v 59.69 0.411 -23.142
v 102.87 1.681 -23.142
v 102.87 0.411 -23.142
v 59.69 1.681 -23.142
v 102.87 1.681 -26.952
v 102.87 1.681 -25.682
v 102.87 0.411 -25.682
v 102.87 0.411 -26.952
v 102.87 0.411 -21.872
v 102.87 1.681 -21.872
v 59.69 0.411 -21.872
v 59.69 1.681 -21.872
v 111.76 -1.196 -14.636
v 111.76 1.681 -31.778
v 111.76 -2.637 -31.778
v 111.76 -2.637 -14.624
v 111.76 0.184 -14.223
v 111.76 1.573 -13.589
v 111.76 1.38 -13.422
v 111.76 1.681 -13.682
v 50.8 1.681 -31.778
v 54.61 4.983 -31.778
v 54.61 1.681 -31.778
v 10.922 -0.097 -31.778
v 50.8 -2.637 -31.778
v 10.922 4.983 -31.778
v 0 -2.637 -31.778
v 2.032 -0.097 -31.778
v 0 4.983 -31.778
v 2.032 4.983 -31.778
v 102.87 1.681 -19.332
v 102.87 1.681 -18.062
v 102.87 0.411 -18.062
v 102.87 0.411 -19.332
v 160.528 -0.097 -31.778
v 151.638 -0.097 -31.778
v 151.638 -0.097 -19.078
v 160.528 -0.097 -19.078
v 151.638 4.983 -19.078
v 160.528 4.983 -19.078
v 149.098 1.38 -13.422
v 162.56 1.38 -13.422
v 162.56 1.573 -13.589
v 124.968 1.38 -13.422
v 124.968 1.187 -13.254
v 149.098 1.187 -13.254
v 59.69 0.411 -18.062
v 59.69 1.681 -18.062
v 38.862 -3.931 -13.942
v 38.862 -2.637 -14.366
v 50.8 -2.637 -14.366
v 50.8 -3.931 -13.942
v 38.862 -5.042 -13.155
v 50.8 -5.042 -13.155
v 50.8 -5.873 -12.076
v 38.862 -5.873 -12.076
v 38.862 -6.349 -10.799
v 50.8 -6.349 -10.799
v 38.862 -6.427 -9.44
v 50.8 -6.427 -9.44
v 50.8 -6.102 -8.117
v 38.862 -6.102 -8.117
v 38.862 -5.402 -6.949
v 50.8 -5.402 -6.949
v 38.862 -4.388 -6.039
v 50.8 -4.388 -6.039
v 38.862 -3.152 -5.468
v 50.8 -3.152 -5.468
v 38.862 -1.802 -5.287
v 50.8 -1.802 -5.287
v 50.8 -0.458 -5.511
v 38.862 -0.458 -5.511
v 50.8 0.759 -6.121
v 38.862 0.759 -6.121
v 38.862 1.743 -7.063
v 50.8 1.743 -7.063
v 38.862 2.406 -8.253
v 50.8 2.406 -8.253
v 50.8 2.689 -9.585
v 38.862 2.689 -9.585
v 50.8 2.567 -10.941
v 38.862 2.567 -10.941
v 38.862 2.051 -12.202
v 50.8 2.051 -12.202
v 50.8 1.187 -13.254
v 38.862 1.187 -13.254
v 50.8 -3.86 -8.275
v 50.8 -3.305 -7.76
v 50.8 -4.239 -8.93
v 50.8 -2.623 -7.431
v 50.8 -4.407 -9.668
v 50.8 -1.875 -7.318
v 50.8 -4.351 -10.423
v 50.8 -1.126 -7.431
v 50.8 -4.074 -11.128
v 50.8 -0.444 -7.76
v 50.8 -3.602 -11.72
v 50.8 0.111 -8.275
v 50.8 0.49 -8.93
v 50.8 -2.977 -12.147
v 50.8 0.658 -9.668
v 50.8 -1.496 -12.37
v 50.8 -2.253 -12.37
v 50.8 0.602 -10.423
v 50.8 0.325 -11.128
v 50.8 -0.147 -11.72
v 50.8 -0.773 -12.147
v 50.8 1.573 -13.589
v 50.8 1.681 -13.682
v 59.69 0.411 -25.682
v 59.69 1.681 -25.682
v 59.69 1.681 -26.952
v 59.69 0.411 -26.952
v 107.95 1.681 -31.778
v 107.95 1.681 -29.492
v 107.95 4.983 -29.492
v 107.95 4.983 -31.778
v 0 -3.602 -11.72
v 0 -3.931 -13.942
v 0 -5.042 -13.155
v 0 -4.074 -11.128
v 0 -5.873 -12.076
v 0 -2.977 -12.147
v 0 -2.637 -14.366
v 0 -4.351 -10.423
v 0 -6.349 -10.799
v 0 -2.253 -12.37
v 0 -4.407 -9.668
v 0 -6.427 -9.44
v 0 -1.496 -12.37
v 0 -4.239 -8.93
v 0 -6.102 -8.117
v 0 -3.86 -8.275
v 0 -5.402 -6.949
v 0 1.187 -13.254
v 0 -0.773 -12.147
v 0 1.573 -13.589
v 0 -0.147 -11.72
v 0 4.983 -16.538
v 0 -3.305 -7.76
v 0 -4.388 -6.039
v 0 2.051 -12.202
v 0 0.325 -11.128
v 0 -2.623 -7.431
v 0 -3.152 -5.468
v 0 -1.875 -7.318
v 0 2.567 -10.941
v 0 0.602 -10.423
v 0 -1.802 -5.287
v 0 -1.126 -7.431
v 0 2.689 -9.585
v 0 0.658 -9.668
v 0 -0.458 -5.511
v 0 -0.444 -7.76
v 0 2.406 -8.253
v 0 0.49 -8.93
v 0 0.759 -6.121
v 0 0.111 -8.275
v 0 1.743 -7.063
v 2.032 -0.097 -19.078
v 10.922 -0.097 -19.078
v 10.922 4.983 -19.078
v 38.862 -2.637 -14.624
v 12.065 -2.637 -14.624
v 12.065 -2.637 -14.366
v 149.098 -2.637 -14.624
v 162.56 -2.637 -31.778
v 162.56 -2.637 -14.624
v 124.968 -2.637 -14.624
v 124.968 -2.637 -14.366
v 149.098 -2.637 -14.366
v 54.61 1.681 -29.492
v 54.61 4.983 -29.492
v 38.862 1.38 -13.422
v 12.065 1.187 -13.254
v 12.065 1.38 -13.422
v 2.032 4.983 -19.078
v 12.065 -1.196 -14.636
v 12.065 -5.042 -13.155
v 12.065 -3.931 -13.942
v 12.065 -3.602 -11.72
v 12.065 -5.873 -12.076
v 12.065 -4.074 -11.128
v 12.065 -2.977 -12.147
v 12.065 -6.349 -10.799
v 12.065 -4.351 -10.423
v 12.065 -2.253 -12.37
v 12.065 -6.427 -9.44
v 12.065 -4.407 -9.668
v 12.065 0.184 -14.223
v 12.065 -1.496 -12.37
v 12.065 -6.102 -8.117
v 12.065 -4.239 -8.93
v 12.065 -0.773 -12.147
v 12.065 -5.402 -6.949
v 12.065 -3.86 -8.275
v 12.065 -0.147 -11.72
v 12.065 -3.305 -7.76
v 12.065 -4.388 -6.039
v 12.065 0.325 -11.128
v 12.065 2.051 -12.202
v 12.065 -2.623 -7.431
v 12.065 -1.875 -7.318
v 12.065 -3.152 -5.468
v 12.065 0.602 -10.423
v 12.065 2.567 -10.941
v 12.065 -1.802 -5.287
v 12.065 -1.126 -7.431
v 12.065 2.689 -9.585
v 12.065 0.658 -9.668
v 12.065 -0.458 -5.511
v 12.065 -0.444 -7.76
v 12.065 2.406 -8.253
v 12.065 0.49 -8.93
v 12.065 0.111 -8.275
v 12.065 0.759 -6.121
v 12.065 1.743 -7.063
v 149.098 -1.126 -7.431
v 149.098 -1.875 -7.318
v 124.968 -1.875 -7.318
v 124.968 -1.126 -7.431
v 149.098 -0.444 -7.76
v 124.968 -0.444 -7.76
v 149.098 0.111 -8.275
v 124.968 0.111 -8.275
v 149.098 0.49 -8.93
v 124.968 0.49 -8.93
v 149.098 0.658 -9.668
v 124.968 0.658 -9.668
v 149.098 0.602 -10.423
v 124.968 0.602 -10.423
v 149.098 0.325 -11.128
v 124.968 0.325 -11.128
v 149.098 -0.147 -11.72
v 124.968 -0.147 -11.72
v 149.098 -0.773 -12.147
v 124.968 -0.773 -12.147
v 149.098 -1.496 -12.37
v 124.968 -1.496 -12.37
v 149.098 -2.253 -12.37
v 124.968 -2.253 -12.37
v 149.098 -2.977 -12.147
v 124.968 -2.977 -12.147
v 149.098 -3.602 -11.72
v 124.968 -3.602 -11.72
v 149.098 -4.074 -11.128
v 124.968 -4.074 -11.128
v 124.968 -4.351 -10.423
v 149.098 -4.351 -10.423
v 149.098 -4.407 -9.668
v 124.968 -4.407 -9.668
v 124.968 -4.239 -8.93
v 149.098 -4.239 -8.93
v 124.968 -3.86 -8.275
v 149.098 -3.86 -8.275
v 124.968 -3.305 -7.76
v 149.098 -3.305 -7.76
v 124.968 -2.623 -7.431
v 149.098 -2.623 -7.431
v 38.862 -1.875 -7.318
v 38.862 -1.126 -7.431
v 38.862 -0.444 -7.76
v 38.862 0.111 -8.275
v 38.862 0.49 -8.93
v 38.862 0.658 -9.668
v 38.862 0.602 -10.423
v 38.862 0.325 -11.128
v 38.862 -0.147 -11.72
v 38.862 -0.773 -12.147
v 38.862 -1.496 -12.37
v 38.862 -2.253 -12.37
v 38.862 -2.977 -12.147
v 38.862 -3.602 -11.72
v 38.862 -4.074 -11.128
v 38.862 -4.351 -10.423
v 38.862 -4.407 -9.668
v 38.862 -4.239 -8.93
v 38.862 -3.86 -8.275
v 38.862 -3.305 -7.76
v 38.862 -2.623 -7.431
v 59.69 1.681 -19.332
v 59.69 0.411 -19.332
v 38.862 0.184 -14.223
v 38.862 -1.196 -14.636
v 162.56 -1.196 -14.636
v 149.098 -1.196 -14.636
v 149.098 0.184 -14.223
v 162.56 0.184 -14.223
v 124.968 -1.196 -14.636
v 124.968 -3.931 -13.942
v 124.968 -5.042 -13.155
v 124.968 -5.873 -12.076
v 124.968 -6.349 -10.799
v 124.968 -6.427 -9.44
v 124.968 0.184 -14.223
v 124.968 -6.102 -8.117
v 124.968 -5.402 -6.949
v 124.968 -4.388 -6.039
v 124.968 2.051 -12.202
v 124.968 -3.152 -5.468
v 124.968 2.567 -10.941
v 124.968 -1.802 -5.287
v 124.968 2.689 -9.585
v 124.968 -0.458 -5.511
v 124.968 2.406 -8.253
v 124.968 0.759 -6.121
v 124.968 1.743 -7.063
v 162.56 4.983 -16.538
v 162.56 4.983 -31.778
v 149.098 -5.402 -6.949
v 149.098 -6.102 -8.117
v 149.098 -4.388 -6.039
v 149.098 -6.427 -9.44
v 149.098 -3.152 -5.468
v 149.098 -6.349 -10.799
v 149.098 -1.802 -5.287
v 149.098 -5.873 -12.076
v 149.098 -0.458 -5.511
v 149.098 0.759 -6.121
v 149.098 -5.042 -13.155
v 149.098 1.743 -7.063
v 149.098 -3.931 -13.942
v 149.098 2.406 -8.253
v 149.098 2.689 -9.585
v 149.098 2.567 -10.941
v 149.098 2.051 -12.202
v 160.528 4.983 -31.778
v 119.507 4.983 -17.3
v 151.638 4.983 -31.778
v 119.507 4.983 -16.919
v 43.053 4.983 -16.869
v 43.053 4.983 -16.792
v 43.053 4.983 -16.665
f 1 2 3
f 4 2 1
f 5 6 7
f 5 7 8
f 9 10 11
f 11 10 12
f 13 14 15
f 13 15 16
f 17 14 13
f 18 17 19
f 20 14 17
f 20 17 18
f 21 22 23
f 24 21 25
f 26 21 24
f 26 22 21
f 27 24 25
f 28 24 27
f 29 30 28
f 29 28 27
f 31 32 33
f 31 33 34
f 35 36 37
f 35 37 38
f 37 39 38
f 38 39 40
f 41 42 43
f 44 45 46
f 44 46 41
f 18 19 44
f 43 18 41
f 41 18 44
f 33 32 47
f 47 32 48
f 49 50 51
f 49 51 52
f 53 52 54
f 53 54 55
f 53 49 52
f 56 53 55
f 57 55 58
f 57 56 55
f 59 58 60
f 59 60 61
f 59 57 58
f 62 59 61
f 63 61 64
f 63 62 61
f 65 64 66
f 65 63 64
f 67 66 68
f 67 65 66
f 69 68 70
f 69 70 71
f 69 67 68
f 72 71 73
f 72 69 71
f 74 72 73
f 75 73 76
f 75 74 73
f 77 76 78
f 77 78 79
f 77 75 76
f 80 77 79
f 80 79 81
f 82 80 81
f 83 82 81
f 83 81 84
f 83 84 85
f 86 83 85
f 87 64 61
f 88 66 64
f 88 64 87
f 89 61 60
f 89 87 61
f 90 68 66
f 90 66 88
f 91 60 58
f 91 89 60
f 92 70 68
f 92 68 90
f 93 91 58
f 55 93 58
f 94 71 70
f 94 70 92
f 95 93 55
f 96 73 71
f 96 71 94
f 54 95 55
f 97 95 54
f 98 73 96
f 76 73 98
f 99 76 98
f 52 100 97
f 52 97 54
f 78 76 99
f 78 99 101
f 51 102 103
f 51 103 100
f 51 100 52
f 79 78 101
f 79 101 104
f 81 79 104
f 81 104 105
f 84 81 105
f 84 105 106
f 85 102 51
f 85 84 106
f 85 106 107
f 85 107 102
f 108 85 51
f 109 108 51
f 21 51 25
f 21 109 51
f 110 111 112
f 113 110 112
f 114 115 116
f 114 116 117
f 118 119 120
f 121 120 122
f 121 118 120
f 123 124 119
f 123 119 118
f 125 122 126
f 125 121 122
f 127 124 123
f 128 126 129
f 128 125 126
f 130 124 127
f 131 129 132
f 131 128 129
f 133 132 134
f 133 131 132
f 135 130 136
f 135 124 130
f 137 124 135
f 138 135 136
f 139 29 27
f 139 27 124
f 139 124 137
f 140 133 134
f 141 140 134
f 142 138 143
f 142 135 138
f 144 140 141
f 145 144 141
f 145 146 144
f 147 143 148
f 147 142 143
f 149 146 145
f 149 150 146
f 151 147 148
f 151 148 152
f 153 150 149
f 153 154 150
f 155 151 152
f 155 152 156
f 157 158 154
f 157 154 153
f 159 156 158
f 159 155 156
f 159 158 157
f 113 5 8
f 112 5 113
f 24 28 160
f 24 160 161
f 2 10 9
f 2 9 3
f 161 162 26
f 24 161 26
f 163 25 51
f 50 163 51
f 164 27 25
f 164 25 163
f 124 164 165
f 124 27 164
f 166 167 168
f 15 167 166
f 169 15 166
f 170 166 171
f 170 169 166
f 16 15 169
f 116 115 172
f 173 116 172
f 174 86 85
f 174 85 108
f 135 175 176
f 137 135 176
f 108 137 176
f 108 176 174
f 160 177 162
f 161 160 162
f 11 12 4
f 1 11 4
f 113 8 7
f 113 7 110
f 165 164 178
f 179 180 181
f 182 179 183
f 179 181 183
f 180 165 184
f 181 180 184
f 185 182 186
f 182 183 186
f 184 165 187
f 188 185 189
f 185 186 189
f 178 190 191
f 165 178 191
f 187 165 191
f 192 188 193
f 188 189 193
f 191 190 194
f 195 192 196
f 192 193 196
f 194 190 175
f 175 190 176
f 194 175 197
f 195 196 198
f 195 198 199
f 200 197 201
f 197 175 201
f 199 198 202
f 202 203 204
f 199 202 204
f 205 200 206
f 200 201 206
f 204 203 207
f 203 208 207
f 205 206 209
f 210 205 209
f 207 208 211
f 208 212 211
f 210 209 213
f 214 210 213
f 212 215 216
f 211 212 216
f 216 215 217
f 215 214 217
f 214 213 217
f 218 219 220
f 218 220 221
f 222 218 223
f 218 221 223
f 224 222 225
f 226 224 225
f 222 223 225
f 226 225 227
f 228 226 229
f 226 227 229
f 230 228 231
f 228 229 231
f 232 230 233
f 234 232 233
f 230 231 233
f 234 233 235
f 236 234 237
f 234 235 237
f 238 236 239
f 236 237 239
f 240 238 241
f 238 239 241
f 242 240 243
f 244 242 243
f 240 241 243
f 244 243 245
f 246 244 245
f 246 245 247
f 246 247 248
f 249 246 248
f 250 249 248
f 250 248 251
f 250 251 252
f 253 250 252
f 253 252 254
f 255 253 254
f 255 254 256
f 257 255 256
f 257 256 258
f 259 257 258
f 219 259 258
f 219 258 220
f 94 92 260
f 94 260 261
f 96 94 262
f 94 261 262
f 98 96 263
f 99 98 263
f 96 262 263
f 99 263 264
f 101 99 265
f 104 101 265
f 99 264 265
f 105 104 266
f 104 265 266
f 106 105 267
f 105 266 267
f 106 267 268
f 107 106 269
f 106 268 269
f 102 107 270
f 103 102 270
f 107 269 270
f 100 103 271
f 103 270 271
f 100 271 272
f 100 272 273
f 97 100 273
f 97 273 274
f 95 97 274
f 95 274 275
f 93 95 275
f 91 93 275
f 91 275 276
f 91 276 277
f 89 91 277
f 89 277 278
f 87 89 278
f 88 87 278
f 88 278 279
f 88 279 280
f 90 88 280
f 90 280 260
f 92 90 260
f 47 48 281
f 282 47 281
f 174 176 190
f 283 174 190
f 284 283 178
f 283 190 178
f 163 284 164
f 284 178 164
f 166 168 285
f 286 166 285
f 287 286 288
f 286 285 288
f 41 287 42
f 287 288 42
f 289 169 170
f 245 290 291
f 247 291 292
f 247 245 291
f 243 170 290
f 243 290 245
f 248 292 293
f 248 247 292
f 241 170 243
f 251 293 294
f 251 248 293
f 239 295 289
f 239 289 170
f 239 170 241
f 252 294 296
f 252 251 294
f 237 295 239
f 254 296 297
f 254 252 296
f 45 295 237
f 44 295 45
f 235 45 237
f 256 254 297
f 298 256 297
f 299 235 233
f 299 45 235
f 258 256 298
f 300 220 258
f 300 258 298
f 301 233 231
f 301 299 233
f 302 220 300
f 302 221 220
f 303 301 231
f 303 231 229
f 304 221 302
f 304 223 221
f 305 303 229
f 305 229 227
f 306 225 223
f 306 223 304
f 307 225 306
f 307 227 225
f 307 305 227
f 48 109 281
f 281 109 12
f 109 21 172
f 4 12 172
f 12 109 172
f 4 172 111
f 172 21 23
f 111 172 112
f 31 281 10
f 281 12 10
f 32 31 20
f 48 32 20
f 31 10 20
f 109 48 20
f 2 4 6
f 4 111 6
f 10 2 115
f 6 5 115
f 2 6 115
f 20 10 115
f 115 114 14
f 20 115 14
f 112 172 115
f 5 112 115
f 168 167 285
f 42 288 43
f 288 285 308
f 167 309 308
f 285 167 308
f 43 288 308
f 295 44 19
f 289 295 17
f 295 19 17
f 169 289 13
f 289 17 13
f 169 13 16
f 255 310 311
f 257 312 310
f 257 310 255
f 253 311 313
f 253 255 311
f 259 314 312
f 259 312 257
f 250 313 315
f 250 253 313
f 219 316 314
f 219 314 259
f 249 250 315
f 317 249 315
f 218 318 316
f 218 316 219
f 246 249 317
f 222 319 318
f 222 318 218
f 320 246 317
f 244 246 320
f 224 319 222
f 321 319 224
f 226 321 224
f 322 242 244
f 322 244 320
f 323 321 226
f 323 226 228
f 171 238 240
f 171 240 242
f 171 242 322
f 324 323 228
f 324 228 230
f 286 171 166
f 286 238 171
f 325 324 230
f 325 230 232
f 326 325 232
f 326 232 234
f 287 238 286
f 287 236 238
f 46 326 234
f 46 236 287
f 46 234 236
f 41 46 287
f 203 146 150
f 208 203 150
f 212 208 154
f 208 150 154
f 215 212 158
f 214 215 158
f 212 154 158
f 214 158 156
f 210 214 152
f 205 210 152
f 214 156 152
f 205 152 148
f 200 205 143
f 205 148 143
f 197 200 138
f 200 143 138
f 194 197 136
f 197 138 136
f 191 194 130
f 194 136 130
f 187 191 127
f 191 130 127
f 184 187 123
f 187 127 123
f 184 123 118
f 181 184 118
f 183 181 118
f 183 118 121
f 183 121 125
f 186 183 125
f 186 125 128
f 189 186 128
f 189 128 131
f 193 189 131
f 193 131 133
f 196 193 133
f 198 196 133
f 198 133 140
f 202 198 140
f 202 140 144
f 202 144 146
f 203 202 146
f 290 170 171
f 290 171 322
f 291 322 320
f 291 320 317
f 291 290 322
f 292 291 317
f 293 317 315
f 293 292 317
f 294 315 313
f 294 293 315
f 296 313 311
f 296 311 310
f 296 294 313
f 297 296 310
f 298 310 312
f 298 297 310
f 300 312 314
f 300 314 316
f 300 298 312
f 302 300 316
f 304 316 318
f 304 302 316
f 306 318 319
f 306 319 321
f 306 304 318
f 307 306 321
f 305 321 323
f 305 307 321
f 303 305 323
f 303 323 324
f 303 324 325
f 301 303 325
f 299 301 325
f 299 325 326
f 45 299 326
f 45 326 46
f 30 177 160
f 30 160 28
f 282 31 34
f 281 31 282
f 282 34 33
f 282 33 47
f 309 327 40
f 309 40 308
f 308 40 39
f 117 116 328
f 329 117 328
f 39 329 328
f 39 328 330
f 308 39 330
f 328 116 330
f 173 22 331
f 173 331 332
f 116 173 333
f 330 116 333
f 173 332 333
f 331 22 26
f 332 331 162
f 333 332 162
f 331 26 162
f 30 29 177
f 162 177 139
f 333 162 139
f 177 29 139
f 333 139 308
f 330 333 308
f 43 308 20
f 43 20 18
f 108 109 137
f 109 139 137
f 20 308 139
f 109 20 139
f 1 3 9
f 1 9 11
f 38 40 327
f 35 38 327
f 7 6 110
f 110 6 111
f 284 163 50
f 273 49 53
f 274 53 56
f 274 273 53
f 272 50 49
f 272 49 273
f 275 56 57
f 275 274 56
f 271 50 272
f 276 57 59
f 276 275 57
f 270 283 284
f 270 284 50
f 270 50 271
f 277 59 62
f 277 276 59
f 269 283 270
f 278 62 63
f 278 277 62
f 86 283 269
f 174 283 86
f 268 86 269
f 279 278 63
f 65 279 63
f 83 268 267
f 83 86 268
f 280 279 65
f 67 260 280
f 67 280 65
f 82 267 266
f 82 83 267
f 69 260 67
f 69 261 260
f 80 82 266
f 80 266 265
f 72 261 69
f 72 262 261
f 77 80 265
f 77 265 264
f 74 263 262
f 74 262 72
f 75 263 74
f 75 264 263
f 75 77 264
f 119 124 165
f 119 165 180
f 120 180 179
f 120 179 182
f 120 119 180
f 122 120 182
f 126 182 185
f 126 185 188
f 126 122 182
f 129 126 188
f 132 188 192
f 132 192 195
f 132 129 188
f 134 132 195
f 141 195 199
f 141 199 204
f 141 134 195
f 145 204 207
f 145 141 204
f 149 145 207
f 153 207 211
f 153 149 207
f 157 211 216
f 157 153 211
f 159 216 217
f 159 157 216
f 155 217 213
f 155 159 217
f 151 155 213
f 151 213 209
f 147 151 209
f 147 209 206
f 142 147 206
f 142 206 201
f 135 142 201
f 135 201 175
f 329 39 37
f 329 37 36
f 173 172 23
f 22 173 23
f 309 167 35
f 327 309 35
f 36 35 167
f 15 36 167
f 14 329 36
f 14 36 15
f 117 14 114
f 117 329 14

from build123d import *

# Parameters (mm, degrees)
SKETCH1_R                = 1.6002
SKETCH1_R_2              = 0.8128
BOSS_EXTRUDE5_DEPTH      = 162.56
CUT_EXTRUDE1_DEPTH       = 14.351
SKETCH3_W                = 0.889
SKETCH3_H                = 5.842
BOSS_EXTRUDE6_DEPTH      = 36.957
SKETCH16_W               = 13.462
SKETCH16_H               = 6.460130881
BOSS_EXTRUDE7_DEPTH      = 33.02
CUT_EXTRUDE4_DEPTH       = 15.24
SKETCH18_W               = 1.778
SKETCH18_H               = 5.842
BOSS_EXTRUDE8_DEPTH      = 38.1
CUT_EXTRUDE5_DEPTH       = 14.224
SKETCH20_W               = 2.1336
SKETCH20_H               = 5.461
BOSS_EXTRUDE9_DEPTH      = 36.322
SKETCH22_R               = 1.4224
CUT_EXTRUDE7_DEPTH       = 20.32
CUT_EXTRUDE7_DEPTH_BACK  = 24.13
SKETCH25_W               = 112.268
SKETCH25_H               = 3.007323321
CUT_EXTRUDE8_DEPTH       = 24.13
SKETCH27_R               = 1.778
CUT_EXTRUDE9_DEPTH       = 112.268
CUT_EXTRUDE12_DEPTH      = 14.224
SKETCH34_W               = 43.053
SKETCH34_H               = 2.1336
BOSS_EXTRUDE14_DEPTH     = 7.112
SKETCH35_R               = 1.4224
CUT_EXTRUDE13_DEPTH      = 7.112
SKETCH37_W               = 60.96
SKETCH37_H               = 15.24
CUT_EXTRUDE14_DEPTH      = 3.048
SKETCH38_R               = 0.8128
CUT_EXTRUDE15_DEPTH      = 5.08
SKETCH39_R               = 0.8128
CUT_EXTRUDE16_DEPTH      = 5.08
SKETCH40_W               = 60.96
SKETCH40_H               = 2.54
CUT_EXTRUDE17_DEPTH      = 3.048
SKETCH41_R               = 1.161307013
BOSS_EXTRUDE15_DEPTH     = 6.604
SKETCH42_R               = 1.020818471
BOSS_EXTRUDE16_DEPTH     = 5.588
SKETCH43_R               = 0.8128
CUT_EXTRUDE18_DEPTH      = 5.08
SKETCH44_R               = 0.8128
CUT_EXTRUDE19_DEPTH      = 5.08
SKETCH46_W               = 60.96
SKETCH46_H               = 9.087986699
CUT_EXTRUDE21_DEPTH      = 3.048
SKETCH47_W               = 53.34
SKETCH47_H               = 2.286
CUT_EXTRUDE22_DEPTH      = 15.24
SKETCH48_R               = 2.54
BOSS_EXTRUDE17_DEPTH     = 25.146
SKETCH49_R               = 2.54
BOSS_EXTRUDE18_DEPTH     = 25.146
SKETCH50_R               = 2.794
CUT_EXTRUDE23_DEPTH      = 112.268
SKETCH51_R               = 1.27
CUT_EXTRUDE24_DEPTH      = 174.498
CUT_EXTRUDE25_DEPTH      = 1.27
SKETCH55_W               = 46.703523857
SKETCH55_H               = 5.873481267
CUT_EXTRUDE26_DEPTH      = 9.144
CUT_EXTRUDE26_DEPTH_BACK = 8.636
SKETCH57_R               = 1.029255476
BOSS_EXTRUDE20_DEPTH     = 5.08
SKETCH58_R               = 1.09273592
BOSS_EXTRUDE21_DEPTH     = 7.112
SKETCH59_R               = 1.016
CUT_EXTRUDE27_DEPTH      = 66.04
CUT_EXTRUDE27_DEPTH_BACK = 5.08
SKETCH60_R               = 1.869467668
SKETCH60_R_2             = 1.016
BOSS_EXTRUDE22_DEPTH     = 162.56
SKETCH61_R               = 2.219373527
CUT_EXTRUDE28_DEPTH      = 112.268
SKETCH62_R               = 1.016
BOSS_EXTRUDE26_DEPTH     = 25.654
SKETCH65_R               = 1.016
BOSS_EXTRUDE27_DEPTH     = 25.654
SKETCH67_R               = 2.794
CUT_EXTRUDE32_DEPTH      = 12.827
SKETCH68_R               = 2.794
CUT_EXTRUDE33_DEPTH      = 12.827
SKETCH72_R               = 2.794
CUT_EXTRUDE34_DEPTH      = 25.654
BOSS_EXTRUDE28_DEPTH     = 0.127
SKETCH77_R               = 1.016
BOSS_EXTRUDE29_DEPTH     = 0.254
SKETCH79_R               = 1.016
CUT_EXTRUDE35_DEPTH      = 15.748
SKETCH87_W               = 23.622
SKETCH87_H               = 13.462
BOSS_EXTRUDE30_DEPTH     = 6.096
CUT_EXTRUDE36_DEPTH      = 14.9098
SKETCH89_W               = 1.4478
SKETCH89_H               = 6.35
BOSS_EXTRUDE31_DEPTH     = 30.6578
BOSS_EXTRUDE32_DEPTH     = 2.159
BOSS_EXTRUDE33_DEPTH     = 2.159
CUT_EXTRUDE38_DEPTH      = 43.053
BOSS_EXTRUDE35_DEPTH     = 14.859
SKETCH98_W               = 13.462
SKETCH98_H               = 6.35
CUT_EXTRUDE41_DEPTH      = 19.431
BOSS_EXTRUDE36_DEPTH     = 15.113
SKETCH102_W              = 13.462
SKETCH102_H              = 6.35
CUT_EXTRUDE42_DEPTH      = 27.051
BOSS_EXTRUDE39_DEPTH     = 2.159
BOSS_EXTRUDE40_DEPTH     = 14.986
BOSS_EXTRUDE41_DEPTH     = 2.159
SKETCH107_R              = 5.08
CUT_EXTRUDE43_DEPTH      = 173.736
SKETCH108_R              = 4.572
SKETCH108_R_2            = 2.54
BOSS_EXTRUDE43_DEPTH     = 162.56
SKETCH111_R              = 5.08
CUT_EXTRUDE44_DEPTH      = 60.96
SKETCH112_R              = 4.826
CUT_EXTRUDE45_DEPTH      = 13.462
SKETCH114_R              = 4.826
CUT_EXTRUDE46_DEPTH      = 26.797
SKETCH116_R              = 4.826
CUT_EXTRUDE47_DEPTH      = 13.208
SKETCH125_R              = 1.016
BOSS_EXTRUDE44_DEPTH     = 8.001
SKETCH126_R              = 1.016
BOSS_EXTRUDE45_DEPTH     = 7.747
SKETCH127_W              = 43.18
SKETCH127_H              = 1.27
BOSS_EXTRUDE46_DEPTH     = 1.27
SKETCH129_W              = 13.462
SKETCH129_H              = 6.35
BOSS_EXTRUDE47_DEPTH     = 47.244
SKETCH130_W              = 12.904618135
SKETCH130_H              = 7.62
BOSS_EXTRUDE48_DEPTH     = 46.482
SKETCH131_W              = 8.89
SKETCH131_H              = 12.7
CUT_EXTRUDE48_DEPTH      = 5.08


with BuildPart() as part:
    # Sketch1 → Boss-Extrude5 (new body)
    with BuildSketch(Plane(origin=(0, 0, 0), x_dir=(0, 0, -1), z_dir=(1, 0, 0))):
        with BuildLine():
            ThreePointArc((11.4584801, -1.874600251), (11.409460099, -2.267640517), (11.265403421, -2.636600251))
            Line((11.265403421, -2.636600251), (11.4584801, -2.636600251))
            Line((11.4584801, -2.636600251), (31.7784801, -2.636600251))
            Line((31.7784801, -2.636600251), (31.7784801, 4.983399749))
            Line((31.7784801, 4.983399749), (16.5384801, 4.983399749))
            Line((16.5384801, 4.983399749), (11.265403421, -1.112600251))
            ThreePointArc((11.265403421, -1.112600251), (11.409460099, -1.481559985), (11.4584801, -1.874600251))
        make_face()
        with Locations((9.8582801, -1.874600251)):
            Circle(SKETCH1_R)
        with Locations((9.8582801, -1.874600251)):
            Circle(SKETCH1_R_2, mode=Mode.SUBTRACT)
    extrude(amount=BOSS_EXTRUDE5_DEPTH)

    # Sketch2 → Cut-Extrude1 (cut)
    with BuildSketch(Plane(origin=(0, 0, -31.7784801), x_dir=(-1, 0, 0), z_dir=(0, 0, -1))):
        Polygon((0, 4.983399749), (0, -0.858600251), (-17.78, -0.858600251), (-23.622, 4.983399749), align=None)
    extrude(amount=-CUT_EXTRUDE1_DEPTH, mode=Mode.SUBTRACT)

    # Sketch3 → Boss-Extrude6 (add)
    with BuildSketch(Plane.ZY):
        with Locations((-31.3339801, 2.062399749)):
            Rectangle(SKETCH3_W, SKETCH3_H)
    extrude(amount=-BOSS_EXTRUDE6_DEPTH)

    # Sketch16 → Boss-Extrude7 (add)
    with BuildSketch(Plane.ZY):
        with Locations((-24.1584801, 1.753334308)):
            Rectangle(SKETCH16_W, SKETCH16_H)
    extrude(amount=-BOSS_EXTRUDE7_DEPTH)

    # Sketch17 → Cut-Extrude4 (cut)
    with BuildSketch(Plane(origin=(0, 0, -31.7784801), x_dir=(-1, 0, 0), z_dir=(0, 0, -1))):
        Polygon((0, 4.983399749), (0, -0.858600251), (-17.78, -0.858600251), (-23.622, 4.983399749), align=None)
    extrude(amount=-CUT_EXTRUDE4_DEPTH, mode=Mode.SUBTRACT)

    # Sketch18 → Boss-Extrude8 (add)
    with BuildSketch(Plane.ZY):
        with Locations((-30.8894801, 2.062399749)):
            Rectangle(SKETCH18_W, SKETCH18_H)
    extrude(amount=-BOSS_EXTRUDE8_DEPTH)

    # Sketch19 → Cut-Extrude5 (cut)
    with BuildSketch(Plane(origin=(0, 0, -31.7784801), x_dir=(-1, 0, 0), z_dir=(0, 0, -1))):
        Polygon((-162.56, 4.983399749), (-162.56, -0.477600251), (-142.24, -0.477600251), (-136.779, 4.983399749), align=None)
    extrude(amount=-CUT_EXTRUDE5_DEPTH, mode=Mode.SUBTRACT)

    # Sketch20 → Boss-Extrude9 (add)
    with BuildSketch(Plane(origin=(162.56, 0, 0), x_dir=(0, 0, -1), z_dir=(1, 0, 0))):
        with Locations((30.7116801, 2.252899749)):
            Rectangle(SKETCH20_W, SKETCH20_H)
    extrude(amount=-BOSS_EXTRUDE9_DEPTH)

    # Sketch22 → Cut-Extrude7 (cut, two sides)
    with BuildSketch(Plane(origin=(0, -0.477600251, 0), x_dir=(1, 0, 0), z_dir=(0, 1, 0))) as cut_extrude7_sk:
        with Locations((145.9484, 26.5714801)):
            Circle(SKETCH22_R)
        with BuildLine():
            ThreePointArc((147.3708, 26.5714801), (146.954188686, 25.565691415), (145.9484, 25.1490801))
            Line((145.9484, 25.1490801), (157.217057139, 25.1490801))
            ThreePointArc((157.217057139, 25.1490801), (155.794657139, 26.5714801), (157.217057139, 27.9938801))
            Line((157.217057139, 27.9938801), (145.9484, 27.9938801))
            ThreePointArc((145.9484, 27.9938801), (146.954188686, 27.577268786), (147.3708, 26.5714801))
        make_face()
        with Locations((157.217057139, 26.5714801)):
            Circle(SKETCH22_R)
        with BuildLine():
            ThreePointArc((157.217057139, 19.1292801), (155.794657139, 20.5516801), (157.217057139, 21.9740801))
            Line((157.217057139, 21.9740801), (145.9484, 21.9740801))
            ThreePointArc((145.9484, 21.9740801), (146.954188686, 21.557468786), (147.3708, 20.5516801))
            ThreePointArc((147.3708, 20.5516801), (146.954188686, 19.545891415), (145.9484, 19.1292801))
            Line((145.9484, 19.1292801), (157.217057139, 19.1292801))
        make_face()
        with Locations((157.217057139, 20.5516801)):
            Circle(SKETCH22_R)
        with Locations((145.9484, 20.5516801)):
            Circle(SKETCH22_R)
    extrude(amount=CUT_EXTRUDE7_DEPTH, mode=Mode.SUBTRACT)
    extrude(cut_extrude7_sk.sketch, amount=-CUT_EXTRUDE7_DEPTH_BACK, mode=Mode.SUBTRACT)

    # Sketch25 → Cut-Extrude8 (cut)
    with BuildSketch(Plane(origin=(0, 4.983399749, 0), x_dir=(1, 0, 0), z_dir=(0, 1, 0))):
        with Locations((81.28, 9.761741761)):
            Rectangle(SKETCH25_W, SKETCH25_H)
    extrude(amount=-CUT_EXTRUDE8_DEPTH, mode=Mode.SUBTRACT)

    # Sketch27 → Cut-Extrude9 (cut)
    with BuildSketch(Plane.ZY.offset(-137.414)):
        with Locations((-9.8582801, -1.874600251)):
            Circle(SKETCH27_R)
    extrude(amount=CUT_EXTRUDE9_DEPTH, mode=Mode.SUBTRACT)

    # Sketch31 → Cut-Extrude12 (cut)
    with BuildSketch(Plane(origin=(0, 0, -31.7784801), x_dir=(-1, 0, 0), z_dir=(0, 0, -1))):
        Polygon((-162.56, 4.983399749), (-162.56, -0.477600251), (-124.968, -0.477600251), (-119.507, 4.983399749), (-124.079, 4.983399749), align=None)
    extrude(amount=-CUT_EXTRUDE12_DEPTH, mode=Mode.SUBTRACT)

    # Sketch34 → Boss-Extrude14 (add)
    with BuildSketch(Plane(origin=(0, 4.983399749, 0), x_dir=(1, 0, 0), z_dir=(0, 1, 0))):
        with Locations((141.0335, 30.7116801)):
            Rectangle(SKETCH34_W, SKETCH34_H)
    extrude(amount=-BOSS_EXTRUDE14_DEPTH)

    # Sketch35 → Cut-Extrude13 (cut)
    with BuildSketch(Plane(origin=(0, -0.477600251, 0), x_dir=(1, 0, 0), z_dir=(0, 1, 0))):
        with BuildLine():
            Line((130.048, 25.1490801), (145.9484, 25.1490801))
            ThreePointArc((145.9484, 25.1490801), (144.526, 26.5714801), (145.9484, 27.9938801))
            Line((145.9484, 27.9938801), (130.048, 27.9938801))
            ThreePointArc((130.048, 27.9938801), (131.053788686, 27.577268786), (131.4704, 26.5714801))
            ThreePointArc((131.4704, 26.5714801), (131.053788686, 25.565691415), (130.048, 25.1490801))
        make_face()
        with BuildLine():
            ThreePointArc((145.9484, 19.1292801), (144.526, 20.5516801), (145.9484, 21.9740801))
            Line((145.9484, 21.9740801), (130.048, 21.9740801))
            ThreePointArc((130.048, 21.9740801), (131.053788686, 21.557468786), (131.4704, 20.5516801))
            ThreePointArc((131.4704, 20.5516801), (131.053788686, 19.545891415), (130.048, 19.1292801))
            Line((130.048, 19.1292801), (145.9484, 19.1292801))
        make_face()
        with Locations((130.048, 20.5516801)):
            Circle(SKETCH35_R)
        with Locations((130.048, 26.5714801)):
            Circle(SKETCH35_R)
    extrude(amount=-CUT_EXTRUDE13_DEPTH, mode=Mode.SUBTRACT)

    # Sketch37 → Cut-Extrude14 (cut)
    with BuildSketch(Plane(origin=(0, -2.636600251, 0), x_dir=(-1, 0, 0), z_dir=(0, -1, 0))):
        with Locations((-81.28, 21.6184801)):
            Rectangle(SKETCH37_W, SKETCH37_H)
    extrude(amount=-CUT_EXTRUDE14_DEPTH, mode=Mode.SUBTRACT)

    # Sketch38 → Cut-Extrude15 (cut)
    with BuildSketch(Plane.ZY.offset(-111.76)):
        with Locations((-27.9684801, -1.112600251)):
            Circle(SKETCH38_R)
    extrude(amount=-CUT_EXTRUDE15_DEPTH, mode=Mode.SUBTRACT)

    # Sketch39 → Cut-Extrude16 (cut)
    with BuildSketch(Plane(origin=(50.8, 0, 0), x_dir=(0, 0, -1), z_dir=(1, 0, 0))):
        with Locations(Location((27.9684801, -1.112600251, 0), (0, 0, 180))):
            Circle(SKETCH39_R)
    extrude(amount=-CUT_EXTRUDE16_DEPTH, mode=Mode.SUBTRACT)

    # Sketch40 → Cut-Extrude17 (cut)
    with BuildSketch(Plane(origin=(0, -2.636600251, 0), x_dir=(-1, 0, 0), z_dir=(0, -1, 0))):
        with Locations((-81.28, 30.5084801)):
            Rectangle(SKETCH40_W, SKETCH40_H)
    extrude(amount=-CUT_EXTRUDE17_DEPTH, mode=Mode.SUBTRACT)

    # Sketch41 → Boss-Extrude15 (add)
    with BuildSketch(Plane(origin=(50.8, 0, 0), x_dir=(0, 0, -1), z_dir=(1, 0, 0))):
        with Locations((27.9684801, -1.112600251)):
            Circle(SKETCH41_R)
    extrude(amount=-BOSS_EXTRUDE15_DEPTH)

    # Sketch42 → Boss-Extrude16 (add)
    with BuildSketch(Plane.ZY.offset(-111.76)):
        with Locations((-27.9684801, -1.112600251)):
            Circle(SKETCH42_R)
    extrude(amount=-BOSS_EXTRUDE16_DEPTH)

    # Sketch43 → Cut-Extrude18 (cut)
    with BuildSketch(Plane(origin=(50.8, 0, 0), x_dir=(0, 0, -1), z_dir=(1, 0, 0))):
        with Locations((30.5084801, -1.112600251)):
            Circle(SKETCH43_R)
    extrude(amount=-CUT_EXTRUDE18_DEPTH, mode=Mode.SUBTRACT)

    # Sketch44 → Cut-Extrude19 (cut)
    with BuildSketch(Plane.ZY.offset(-111.76)):
        with Locations(Location((-30.5084801, -1.112600251, 0), (0, 0, 180))):
            Circle(SKETCH44_R)
    extrude(amount=-CUT_EXTRUDE19_DEPTH, mode=Mode.SUBTRACT)

    # Sketch46 → Cut-Extrude21 (cut)
    with BuildSketch(Plane(origin=(0, -2.636600251, 0), x_dir=(-1, 0, 0), z_dir=(0, -1, 0))):
        with Locations((-81.28, 9.45448675)):
            Rectangle(SKETCH46_W, SKETCH46_H)
    extrude(amount=-CUT_EXTRUDE21_DEPTH, mode=Mode.SUBTRACT)

    # Sketch47 → Cut-Extrude22 (cut)
    with BuildSketch(Plane(origin=(0, 0.411399749, 0), x_dir=(-1, 0, 0), z_dir=(0, -1, 0))):
        with Locations((-81.28, 30.6354801)):
            Rectangle(SKETCH47_W, SKETCH47_H)
    extrude(amount=-CUT_EXTRUDE22_DEPTH, mode=Mode.SUBTRACT)

    # Sketch48 → Boss-Extrude17 (add)
    with BuildSketch(Plane.ZY):
        with Locations((-9.8582801, -1.874600251)):
            Circle(SKETCH48_R)
    extrude(amount=-BOSS_EXTRUDE17_DEPTH)

    # Sketch49 → Boss-Extrude18 (add)
    with BuildSketch(Plane(origin=(162.56, 0, 0), x_dir=(0, 0, -1), z_dir=(1, 0, 0))):
        with Locations((9.8582801, -1.874600251)):
            Circle(SKETCH49_R)
    extrude(amount=-BOSS_EXTRUDE18_DEPTH)

    # Sketch50 → Cut-Extrude23 (cut)
    with BuildSketch(Plane.ZY.offset(-137.414)):
        with Locations((-9.8582801, -1.874600251)):
            Circle(SKETCH50_R)
    extrude(amount=CUT_EXTRUDE23_DEPTH, mode=Mode.SUBTRACT)

    # Sketch51 → Cut-Extrude24 (cut)
    with BuildSketch(Plane(origin=(162.56, 0, 0), x_dir=(0, 0, -1), z_dir=(1, 0, 0))):
        with Locations((9.8582801, -1.874600251)):
            Circle(SKETCH51_R)
    extrude(amount=-CUT_EXTRUDE24_DEPTH, mode=Mode.SUBTRACT)

    # Sketch52 → Cut-Extrude25 (cut)
    with BuildSketch(Plane(origin=(0, 0.411399749, 0), x_dir=(-1, 0, 0), z_dir=(0, -1, 0))):
        Polygon((-50.8, 31.7784801), (-50.8, 12.546363432), (-111.76, 12.6522801), (-111.76, 31.7784801), align=None)
    extrude(amount=-CUT_EXTRUDE25_DEPTH, mode=Mode.SUBTRACT)

    # Sketch55 → Cut-Extrude26 (cut, two sides)
    with BuildSketch(Plane.XZ.offset(2.636600251)) as cut_extrude26_sk:
        with Locations((88.408238071, -10.745489599)):
            Rectangle(SKETCH55_W, SKETCH55_H)
    extrude(amount=CUT_EXTRUDE26_DEPTH, mode=Mode.SUBTRACT)
    extrude(cut_extrude26_sk.sketch, amount=-CUT_EXTRUDE26_DEPTH_BACK, mode=Mode.SUBTRACT)

    # Sketch57 → Boss-Extrude20 (add)
    with BuildSketch(Plane(origin=(45.72, 0, 0), x_dir=(0, 0, -1), z_dir=(1, 0, 0))):
        with Locations((30.5084801, -1.112600251)):
            Circle(SKETCH57_R)
    extrude(amount=BOSS_EXTRUDE20_DEPTH)

    # Sketch58 → Boss-Extrude21 (add)
    with BuildSketch(Plane.ZY.offset(-111.76)):
        with Locations((-30.5084801, -1.112600251)):
            Circle(SKETCH58_R)
    extrude(amount=-BOSS_EXTRUDE21_DEPTH)

    # Sketch59 → Cut-Extrude27 (cut, two sides)
    with BuildSketch(Plane(origin=(50.8, 0, 0), x_dir=(0, 0, -1), z_dir=(1, 0, 0))) as cut_extrude27_sk:
        with Locations((29.2384801, -0.477600251)):
            Circle(SKETCH59_R)
    extrude(amount=CUT_EXTRUDE27_DEPTH, mode=Mode.SUBTRACT)
    extrude(cut_extrude27_sk.sketch, amount=-CUT_EXTRUDE27_DEPTH_BACK, mode=Mode.SUBTRACT)

    # Sketch60 → Boss-Extrude22 (add)
    with BuildSketch(Plane.ZY):
        with Locations((-9.8582801, -1.874600251)):
            Circle(SKETCH60_R)
        with Locations((-9.8582801, -1.874600251)):
            Circle(SKETCH60_R_2, mode=Mode.SUBTRACT)
    extrude(amount=-BOSS_EXTRUDE22_DEPTH)

    # Sketch61 → Cut-Extrude28 (cut)
    with BuildSketch(Plane.ZY.offset(-137.414)):
        with Locations((-9.8582801, -1.874600251)):
            Circle(SKETCH61_R)
    extrude(amount=CUT_EXTRUDE28_DEPTH, mode=Mode.SUBTRACT)

    # Sketch62 → Boss-Extrude26 (add)
    with BuildSketch(Plane(origin=(25.146, 0, 0), x_dir=(0, 0, -1), z_dir=(1, 0, 0))):
        with BuildLine():
            Line((12.07614536, -0.175332853), (11.906096413, -0.371919863))
            ThreePointArc((11.906096413, -0.371919863), (12.272100043, -1.083984489), (12.3982801, -1.874600251))
            ThreePointArc((12.3982801, -1.874600251), (12.368861124, -2.260064807), (12.281285672, -2.636600251))
            Line((12.281285672, -2.636600251), (12.546363432, -2.636600251))
            ThreePointArc((12.546363432, -2.636600251), (12.602645637, -1.350297092), (12.07614536, -0.175332853))
        make_face()
        with BuildLine():
            ThreePointArc((12.3982801, -1.874600251), (12.272100043, -1.083984489), (11.906096413, -0.371919863))
            ThreePointArc((11.906096413, -0.371919863), (7.352435653, -2.289743123), (12.281285672, -2.636600251))
            ThreePointArc((12.281285672, -2.636600251), (12.368861124, -2.260064807), (12.3982801, -1.874600251))
        make_face()
        with Locations(Location((9.8582801, -1.874600251, 0), (0, 0, 180))):
            Circle(SKETCH62_R, mode=Mode.SUBTRACT)
    extrude(amount=BOSS_EXTRUDE26_DEPTH)

    # Sketch65 → Boss-Extrude27 (add)
    with BuildSketch(Plane.ZY.offset(-137.414)):
        with BuildLine():
            ThreePointArc((-12.281285672, -2.636600251), (-12.364124548, -1.459457379), (-11.906096413, -0.371919863))
            Line((-11.906096413, -0.371919863), (-12.07614536, -0.175332853))
            ThreePointArc((-12.07614536, -0.175332853), (-12.602645637, -1.350297092), (-12.546363432, -2.636600251))
            Line((-12.546363432, -2.636600251), (-12.281285672, -2.636600251))
        make_face()
        with BuildLine():
            ThreePointArc((-7.3182801, -1.874600251), (-9.067664339, 0.539219692), (-11.906096413, -0.371919863))
            ThreePointArc((-11.906096413, -0.371919863), (-12.364124548, -1.459457379), (-12.281285672, -2.636600251))
            ThreePointArc((-12.281285672, -2.636600251), (-9.472815544, -4.385181275), (-7.3182801, -1.874600251))
        make_face()
        with Locations((-9.8582801, -1.874600251)):
            Circle(SKETCH65_R, mode=Mode.SUBTRACT)
    extrude(amount=BOSS_EXTRUDE27_DEPTH)

    # Sketch67 → Cut-Extrude32 (cut)
    with BuildSketch(Plane(origin=(162.56, 0, 0), x_dir=(0, 0, -1), z_dir=(1, 0, 0))):
        with Locations((9.8582801, -1.874600251)):
            Circle(SKETCH67_R)
    extrude(amount=-CUT_EXTRUDE32_DEPTH, mode=Mode.SUBTRACT)

    # Sketch68 → Cut-Extrude33 (cut)
    with BuildSketch(Plane.ZY.offset(-111.76)):
        with Locations((-9.8582801, -1.874600251)):
            Circle(SKETCH68_R)
    extrude(amount=-CUT_EXTRUDE33_DEPTH, mode=Mode.SUBTRACT)

    # Sketch72 → Cut-Extrude34 (cut)
    with BuildSketch(Plane.ZY.offset(-12.573)):
        with Locations((-9.8582801, -1.874600251)):
            Circle(SKETCH72_R)
    extrude(amount=-CUT_EXTRUDE34_DEPTH, mode=Mode.SUBTRACT)

    # Sketch74 → Boss-Extrude28 (add)
    with BuildSketch(Plane.ZY.offset(-12.573)):
        with BuildLine():
            Line((-12.546363432, -2.636600251), (-12.281285672, -2.636600251))
            ThreePointArc((-12.281285672, -2.636600251), (-7.352435653, -2.289743123), (-11.906096413, -0.371919863))
            Line((-11.906096413, -0.371919863), (-12.07614536, -0.175332853))
            ThreePointArc((-12.07614536, -0.175332853), (-12.602645637, -1.350297092), (-12.546363432, -2.636600251))
        make_face()
    extrude(amount=-BOSS_EXTRUDE28_DEPTH)

    # Sketch77 → Boss-Extrude29 (add)
    with BuildSketch(Plane.ZY.offset(-124.587)):
        with BuildLine():
            ThreePointArc((-11.906096413, -0.371919863), (-12.364124548, -1.459457379), (-12.281285672, -2.636600251))
            ThreePointArc((-12.281285672, -2.636600251), (-9.472815544, -4.385181275), (-7.3182801, -1.874600251))
            ThreePointArc((-7.3182801, -1.874600251), (-9.067664339, 0.539219692), (-11.906096413, -0.371919863))
        make_face()
        with Locations((-9.8582801, -1.874600251)):
            Circle(SKETCH77_R, mode=Mode.SUBTRACT)
        with BuildLine():
            Line((-12.546363432, -2.636600251), (-12.281285672, -2.636600251))
            ThreePointArc((-12.281285672, -2.636600251), (-12.364124548, -1.459457379), (-11.906096413, -0.371919863))
            Line((-11.906096413, -0.371919863), (-12.07614536, -0.175332853))
            ThreePointArc((-12.07614536, -0.175332853), (-12.602645637, -1.350297092), (-12.546363432, -2.636600251))
        make_face()
    extrude(amount=BOSS_EXTRUDE29_DEPTH)

    # Sketch79 → Cut-Extrude35 (cut)
    with BuildSketch(Plane.ZY):
        with Locations((-9.8582801, -1.874600251)):
            Circle(SKETCH79_R)
    extrude(amount=-CUT_EXTRUDE35_DEPTH, mode=Mode.SUBTRACT)

    # Sketch87 → Boss-Extrude30 (add)
    with BuildSketch(Plane(origin=(0, 4.983399749, 0), x_dir=(1, 0, 0), z_dir=(0, 1, 0))):
        with Locations((11.811, 23.2694801)):
            Rectangle(SKETCH87_W, SKETCH87_H)
    extrude(amount=-BOSS_EXTRUDE30_DEPTH)

    # Sketch88 → Cut-Extrude36 (cut)
    with BuildSketch(Plane(origin=(0, 0, -31.7784801), x_dir=(-1, 0, 0), z_dir=(0, 0, -1))):
        Polygon((0, 4.983399749), (0, -1.366600251), (-17.78, -1.366600251), (-23.622, 4.983399749), align=None)
    extrude(amount=-CUT_EXTRUDE36_DEPTH, mode=Mode.SUBTRACT)

    # Sketch89 → Boss-Extrude31 (add)
    with BuildSketch(Plane.ZY):
        with Locations((-31.0545801, 1.808399749)):
            Rectangle(SKETCH89_W, SKETCH89_H)
    extrude(amount=-BOSS_EXTRUDE31_DEPTH)

    # Sketch90 → Boss-Extrude32 (add)
    with BuildSketch(Plane(origin=(0, -2.636600251, 0), x_dir=(-1, 0, 0), z_dir=(0, -1, 0))):
        with BuildLine():
            Line((-130.048, 27.9938801), (-137.16, 27.9938801))
            ThreePointArc((-137.16, 27.9938801), (-136.154211314, 27.577268786), (-135.7376, 26.5714801))
            ThreePointArc((-135.7376, 26.5714801), (-136.154211314, 25.565691415), (-137.16, 25.1490801))
            Line((-137.16, 25.1490801), (-130.048, 25.1490801))
            ThreePointArc((-130.048, 25.1490801), (-128.6256, 26.5714801), (-130.048, 27.9938801))
        make_face()
        with BuildLine():
            ThreePointArc((-135.7376, 20.5516801), (-136.154211314, 19.545891415), (-137.16, 19.1292801))
            Line((-137.16, 19.1292801), (-130.048, 19.1292801))
            ThreePointArc((-130.048, 19.1292801), (-128.6256, 20.5516801), (-130.048, 21.9740801))
            Line((-130.048, 21.9740801), (-137.16, 21.9740801))
            ThreePointArc((-137.16, 21.9740801), (-136.154211314, 21.557468786), (-135.7376, 20.5516801))
        make_face()
    extrude(amount=-BOSS_EXTRUDE32_DEPTH)

    # Sketch91 → Boss-Extrude33 (add)
    with BuildSketch(Plane(origin=(0, -2.636600251, 0), x_dir=(-1, 0, 0), z_dir=(0, -1, 0))):
        with BuildLine():
            Line((-156.251857139, 26.5714801), (-158.639457139, 26.5714801))
            ThreePointArc((-158.639457139, 26.5714801), (-158.222845825, 25.565691415), (-157.217057139, 25.1490801))
            Line((-157.217057139, 25.1490801), (-154.829457139, 25.1490801))
            ThreePointArc((-154.829457139, 25.1490801), (-155.835245825, 25.565691415), (-156.251857139, 26.5714801))
        make_face()
        with BuildLine():
            ThreePointArc((-157.217057139, 27.9938801), (-158.222845825, 27.577268786), (-158.639457139, 26.5714801))
            Line((-158.639457139, 26.5714801), (-156.251857139, 26.5714801))
            ThreePointArc((-156.251857139, 26.5714801), (-155.835245825, 27.577268786), (-154.829457139, 27.9938801))
            Line((-154.829457139, 27.9938801), (-157.217057139, 27.9938801))
        make_face()
        with BuildLine():
            ThreePointArc((-157.217057139, 21.9740801), (-158.222845825, 21.557468786), (-158.639457139, 20.5516801))
            Line((-158.639457139, 20.5516801), (-156.251857139, 20.5516801))
            ThreePointArc((-156.251857139, 20.5516801), (-155.835245825, 21.557468786), (-154.829457139, 21.9740801))
            Line((-154.829457139, 21.9740801), (-157.217057139, 21.9740801))
        make_face()
        with BuildLine():
            Line((-156.251857139, 20.5516801), (-158.639457139, 20.5516801))
            ThreePointArc((-158.639457139, 20.5516801), (-158.222845825, 19.545891415), (-157.217057139, 19.1292801))
            Line((-157.217057139, 19.1292801), (-154.829457139, 19.1292801))
            ThreePointArc((-154.829457139, 19.1292801), (-155.835245825, 19.545891415), (-156.251857139, 20.5516801))
        make_face()
    extrude(amount=-BOSS_EXTRUDE33_DEPTH)

    # Sketch92 → Cut-Extrude38 (cut)
    with BuildSketch(Plane(origin=(162.56, 0, 0), x_dir=(0, 0, -1), z_dir=(1, 0, 0))):
        Polygon((29.6448801, -0.477600251), (29.8988801, -0.477600251), (29.8988801, 4.983399749), (17.3004801, 4.983399749), (17.3004801, -0.477600251), align=None)
    extrude(amount=-CUT_EXTRUDE38_DEPTH, mode=Mode.SUBTRACT)

    # Sketch94 → Boss-Extrude35 (add)
    with BuildSketch(Plane(origin=(0, 0, -31.7784801), x_dir=(-1, 0, 0), z_dir=(0, 0, -1))):
        Polygon((-119.507, 4.983399749), (-124.968, -0.477600251), (-119.507, -0.477600251), align=None)
    extrude(amount=-BOSS_EXTRUDE35_DEPTH)

    # Sketch98 → Cut-Extrude41 (cut)
    with BuildSketch(Plane.ZY.offset(-23.622)):
        with Locations((-23.5996801, 1.808399749)):
            Rectangle(SKETCH98_W, SKETCH98_H)
    extrude(amount=-CUT_EXTRUDE41_DEPTH, mode=Mode.SUBTRACT)

    # Sketch101 → Boss-Extrude36 (add)
    with BuildSketch(Plane(origin=(0, 0, -31.7784801), x_dir=(-1, 0, 0), z_dir=(0, 0, -1))):
        Polygon((-43.053, 4.983399749), (-37.592, -0.477600251), (-43.053, -0.477600251), align=None)
    extrude(amount=-BOSS_EXTRUDE36_DEPTH)

    # Sketch102 → Cut-Extrude42 (cut)
    with BuildSketch(Plane.ZY):
        with Locations((-23.5996801, 1.808399749)):
            Rectangle(SKETCH102_W, SKETCH102_H)
    extrude(amount=-CUT_EXTRUDE42_DEPTH, mode=Mode.SUBTRACT)

    # Sketch103 → Boss-Extrude39 (add)
    with BuildSketch(Plane(origin=(0, -0.477600251, 0), x_dir=(1, 0, 0), z_dir=(0, 1, 0))):
        with BuildLine():
            ThreePointArc((137.7696, 26.5714801), (138.186211314, 27.577268786), (139.192, 27.9938801))
            Line((139.192, 27.9938801), (137.16, 27.9938801))
            ThreePointArc((137.16, 27.9938801), (135.7376, 26.5714801), (137.16, 25.1490801))
            Line((137.16, 25.1490801), (139.192, 25.1490801))
            ThreePointArc((139.192, 25.1490801), (138.186211314, 25.565691415), (137.7696, 26.5714801))
        make_face()
        with BuildLine():
            ThreePointArc((137.7696, 20.5516801), (138.186211314, 21.557468786), (139.192, 21.9740801))
            Line((139.192, 21.9740801), (137.16, 21.9740801))
            ThreePointArc((137.16, 21.9740801), (135.7376, 20.5516801), (137.16, 19.1292801))
            Line((137.16, 19.1292801), (139.192, 19.1292801))
            ThreePointArc((139.192, 19.1292801), (138.186211314, 19.545891415), (137.7696, 20.5516801))
        make_face()
    extrude(amount=-BOSS_EXTRUDE39_DEPTH)

    # Sketch105 → Boss-Extrude40 (add)
    with BuildSketch(Plane(origin=(0, 0, -31.7784801), x_dir=(-1, 0, 0), z_dir=(0, 0, -1))):
        Polygon((-43.053, 4.983399749), (-43.053, -2.200805148), (-35.868795103, -2.200805148), align=None)
    extrude(amount=-BOSS_EXTRUDE40_DEPTH)

    # Sketch106 → Boss-Extrude41 (add)
    with BuildSketch(Plane(origin=(0, -0.477600251, 0), x_dir=(1, 0, 0), z_dir=(0, 1, 0))):
        with BuildLine():
            ThreePointArc((154.432, 27.9938801), (155.437788686, 27.577268786), (155.8544, 26.5714801))
            ThreePointArc((155.8544, 26.5714801), (155.437788686, 25.565691415), (154.432, 25.1490801))
            Line((154.432, 25.1490801), (154.829457139, 25.1490801))
            ThreePointArc((154.829457139, 25.1490801), (156.251857139, 26.5714801), (154.829457139, 27.9938801))
            Line((154.829457139, 27.9938801), (154.432, 27.9938801))
        make_face()
        with BuildLine():
            ThreePointArc((154.432, 21.9740801), (155.437788686, 21.557468786), (155.8544, 20.5516801))
            ThreePointArc((155.8544, 20.5516801), (155.437788686, 19.545891415), (154.432, 19.1292801))
            Line((154.432, 19.1292801), (154.829457139, 19.1292801))
            ThreePointArc((154.829457139, 19.1292801), (156.251857139, 20.5516801), (154.829457139, 21.9740801))
            Line((154.829457139, 21.9740801), (154.432, 21.9740801))
        make_face()
    extrude(amount=-BOSS_EXTRUDE41_DEPTH)

    # Sketch107 → Cut-Extrude43 (cut)
    with BuildSketch(Plane(origin=(162.56, 0, 0), x_dir=(0, 0, -1), z_dir=(1, 0, 0))):
        with Locations((9.8582801, -1.874600251)):
            Circle(SKETCH107_R)
    extrude(amount=-CUT_EXTRUDE43_DEPTH, mode=Mode.SUBTRACT)

    # Sketch108 → Boss-Extrude43 (add)
    with BuildSketch(Plane.ZY):
        with BuildLine():
            Line((-13.25421048, 1.186582667), (-13.588864385, 1.573463104))
            ThreePointArc((-13.588864385, 1.573463104), (-14.714759103, -0.384294342), (-14.880804963, -2.636600251))
            Line((-14.880804963, -2.636600251), (-14.366332895, -2.636600251))
            ThreePointArc((-14.366332895, -2.636600251), (-14.24831648, -0.597586316), (-13.25421048, 1.186582667))
        make_face()
        with Locations((-9.8582801, -1.874600251)):
            Circle(SKETCH108_R)
        with Locations((-9.8582801, -1.874600251)):
            Circle(SKETCH108_R_2, mode=Mode.SUBTRACT)
    extrude(amount=-BOSS_EXTRUDE43_DEPTH)

    # Sketch111 → Cut-Extrude44 (cut)
    with BuildSketch(Plane(origin=(50.8, 0, 0), x_dir=(0, 0, -1), z_dir=(1, 0, 0))):
        with Locations((9.8582801, -1.874600251)):
            Circle(SKETCH111_R)
    extrude(amount=CUT_EXTRUDE44_DEPTH, mode=Mode.SUBTRACT)

    # Sketch112 → Cut-Extrude45 (cut)
    with BuildSketch(Plane(origin=(162.56, 0, 0), x_dir=(0, 0, -1), z_dir=(1, 0, 0))):
        with Locations((9.8582801, -1.874600251)):
            Circle(SKETCH112_R)
    extrude(amount=-CUT_EXTRUDE45_DEPTH, mode=Mode.SUBTRACT)

    # Sketch114 → Cut-Extrude46 (cut)
    with BuildSketch(Plane.ZY.offset(-12.065)):
        with Locations((-9.8582801, -1.874600251)):
            Circle(SKETCH114_R)
    extrude(amount=-CUT_EXTRUDE46_DEPTH, mode=Mode.SUBTRACT)

    # Sketch116 → Cut-Extrude47 (cut)
    with BuildSketch(Plane.ZY.offset(-111.76)):
        with Locations((-9.8582801, -1.874600251)):
            Circle(SKETCH116_R)
    extrude(amount=-CUT_EXTRUDE47_DEPTH, mode=Mode.SUBTRACT)

    # Sketch125 → Boss-Extrude44 (add)
    with BuildSketch(Plane.ZY.offset(-111.76)):
        with Locations((-29.2384801, -0.477600251)):
            Circle(SKETCH125_R)
    extrude(amount=-BOSS_EXTRUDE44_DEPTH)

    # Sketch126 → Boss-Extrude45 (add)
    with BuildSketch(Plane(origin=(50.8, 0, 0), x_dir=(0, 0, -1), z_dir=(1, 0, 0))):
        with Locations((29.2384801, -0.477600251)):
            Circle(SKETCH126_R)
    extrude(amount=-BOSS_EXTRUDE45_DEPTH)

    # Sketch127 → Boss-Extrude46 (add)
    with BuildSketch(Plane(origin=(0, 1.681399749, 0), x_dir=(-1, 0, 0), z_dir=(0, -1, 0))):
        with Locations((-81.28, 26.3174801)):
            Rectangle(SKETCH127_W, SKETCH127_H)
        with Locations((-81.28, 22.5074801)):
            Rectangle(SKETCH127_W, SKETCH127_H)
        with Locations((-81.28, 18.6974801)):
            Rectangle(SKETCH127_W, SKETCH127_H)
    extrude(amount=BOSS_EXTRUDE46_DEPTH)

    # Sketch129 → Boss-Extrude47 (add)
    with BuildSketch(Plane.ZY):
        with Locations((-23.5996801, 1.808399749)):
            Rectangle(SKETCH129_W, SKETCH129_H)
    extrude(amount=-BOSS_EXTRUDE47_DEPTH)

    # Sketch130 → Boss-Extrude48 (add)
    with BuildSketch(Plane(origin=(162.56, 0, 0), x_dir=(0, 0, -1), z_dir=(1, 0, 0))):
        with Locations((23.752789168, 1.173399749)):
            Rectangle(SKETCH130_W, SKETCH130_H)
    extrude(amount=-BOSS_EXTRUDE48_DEPTH)

    # Sketch131 → Cut-Extrude48 (cut)
    with BuildSketch(Plane(origin=(0, 4.983399749, 0), x_dir=(1, 0, 0), z_dir=(0, 1, 0))):
        with Locations((156.083, 25.4284801)):
            Rectangle(SKETCH131_W, SKETCH131_H)
        with Locations((6.477, 25.4284801)):
            Rectangle(SKETCH131_W, SKETCH131_H)
    extrude(amount=-CUT_EXTRUDE48_DEPTH, mode=Mode.SUBTRACT)


solid = part.part
